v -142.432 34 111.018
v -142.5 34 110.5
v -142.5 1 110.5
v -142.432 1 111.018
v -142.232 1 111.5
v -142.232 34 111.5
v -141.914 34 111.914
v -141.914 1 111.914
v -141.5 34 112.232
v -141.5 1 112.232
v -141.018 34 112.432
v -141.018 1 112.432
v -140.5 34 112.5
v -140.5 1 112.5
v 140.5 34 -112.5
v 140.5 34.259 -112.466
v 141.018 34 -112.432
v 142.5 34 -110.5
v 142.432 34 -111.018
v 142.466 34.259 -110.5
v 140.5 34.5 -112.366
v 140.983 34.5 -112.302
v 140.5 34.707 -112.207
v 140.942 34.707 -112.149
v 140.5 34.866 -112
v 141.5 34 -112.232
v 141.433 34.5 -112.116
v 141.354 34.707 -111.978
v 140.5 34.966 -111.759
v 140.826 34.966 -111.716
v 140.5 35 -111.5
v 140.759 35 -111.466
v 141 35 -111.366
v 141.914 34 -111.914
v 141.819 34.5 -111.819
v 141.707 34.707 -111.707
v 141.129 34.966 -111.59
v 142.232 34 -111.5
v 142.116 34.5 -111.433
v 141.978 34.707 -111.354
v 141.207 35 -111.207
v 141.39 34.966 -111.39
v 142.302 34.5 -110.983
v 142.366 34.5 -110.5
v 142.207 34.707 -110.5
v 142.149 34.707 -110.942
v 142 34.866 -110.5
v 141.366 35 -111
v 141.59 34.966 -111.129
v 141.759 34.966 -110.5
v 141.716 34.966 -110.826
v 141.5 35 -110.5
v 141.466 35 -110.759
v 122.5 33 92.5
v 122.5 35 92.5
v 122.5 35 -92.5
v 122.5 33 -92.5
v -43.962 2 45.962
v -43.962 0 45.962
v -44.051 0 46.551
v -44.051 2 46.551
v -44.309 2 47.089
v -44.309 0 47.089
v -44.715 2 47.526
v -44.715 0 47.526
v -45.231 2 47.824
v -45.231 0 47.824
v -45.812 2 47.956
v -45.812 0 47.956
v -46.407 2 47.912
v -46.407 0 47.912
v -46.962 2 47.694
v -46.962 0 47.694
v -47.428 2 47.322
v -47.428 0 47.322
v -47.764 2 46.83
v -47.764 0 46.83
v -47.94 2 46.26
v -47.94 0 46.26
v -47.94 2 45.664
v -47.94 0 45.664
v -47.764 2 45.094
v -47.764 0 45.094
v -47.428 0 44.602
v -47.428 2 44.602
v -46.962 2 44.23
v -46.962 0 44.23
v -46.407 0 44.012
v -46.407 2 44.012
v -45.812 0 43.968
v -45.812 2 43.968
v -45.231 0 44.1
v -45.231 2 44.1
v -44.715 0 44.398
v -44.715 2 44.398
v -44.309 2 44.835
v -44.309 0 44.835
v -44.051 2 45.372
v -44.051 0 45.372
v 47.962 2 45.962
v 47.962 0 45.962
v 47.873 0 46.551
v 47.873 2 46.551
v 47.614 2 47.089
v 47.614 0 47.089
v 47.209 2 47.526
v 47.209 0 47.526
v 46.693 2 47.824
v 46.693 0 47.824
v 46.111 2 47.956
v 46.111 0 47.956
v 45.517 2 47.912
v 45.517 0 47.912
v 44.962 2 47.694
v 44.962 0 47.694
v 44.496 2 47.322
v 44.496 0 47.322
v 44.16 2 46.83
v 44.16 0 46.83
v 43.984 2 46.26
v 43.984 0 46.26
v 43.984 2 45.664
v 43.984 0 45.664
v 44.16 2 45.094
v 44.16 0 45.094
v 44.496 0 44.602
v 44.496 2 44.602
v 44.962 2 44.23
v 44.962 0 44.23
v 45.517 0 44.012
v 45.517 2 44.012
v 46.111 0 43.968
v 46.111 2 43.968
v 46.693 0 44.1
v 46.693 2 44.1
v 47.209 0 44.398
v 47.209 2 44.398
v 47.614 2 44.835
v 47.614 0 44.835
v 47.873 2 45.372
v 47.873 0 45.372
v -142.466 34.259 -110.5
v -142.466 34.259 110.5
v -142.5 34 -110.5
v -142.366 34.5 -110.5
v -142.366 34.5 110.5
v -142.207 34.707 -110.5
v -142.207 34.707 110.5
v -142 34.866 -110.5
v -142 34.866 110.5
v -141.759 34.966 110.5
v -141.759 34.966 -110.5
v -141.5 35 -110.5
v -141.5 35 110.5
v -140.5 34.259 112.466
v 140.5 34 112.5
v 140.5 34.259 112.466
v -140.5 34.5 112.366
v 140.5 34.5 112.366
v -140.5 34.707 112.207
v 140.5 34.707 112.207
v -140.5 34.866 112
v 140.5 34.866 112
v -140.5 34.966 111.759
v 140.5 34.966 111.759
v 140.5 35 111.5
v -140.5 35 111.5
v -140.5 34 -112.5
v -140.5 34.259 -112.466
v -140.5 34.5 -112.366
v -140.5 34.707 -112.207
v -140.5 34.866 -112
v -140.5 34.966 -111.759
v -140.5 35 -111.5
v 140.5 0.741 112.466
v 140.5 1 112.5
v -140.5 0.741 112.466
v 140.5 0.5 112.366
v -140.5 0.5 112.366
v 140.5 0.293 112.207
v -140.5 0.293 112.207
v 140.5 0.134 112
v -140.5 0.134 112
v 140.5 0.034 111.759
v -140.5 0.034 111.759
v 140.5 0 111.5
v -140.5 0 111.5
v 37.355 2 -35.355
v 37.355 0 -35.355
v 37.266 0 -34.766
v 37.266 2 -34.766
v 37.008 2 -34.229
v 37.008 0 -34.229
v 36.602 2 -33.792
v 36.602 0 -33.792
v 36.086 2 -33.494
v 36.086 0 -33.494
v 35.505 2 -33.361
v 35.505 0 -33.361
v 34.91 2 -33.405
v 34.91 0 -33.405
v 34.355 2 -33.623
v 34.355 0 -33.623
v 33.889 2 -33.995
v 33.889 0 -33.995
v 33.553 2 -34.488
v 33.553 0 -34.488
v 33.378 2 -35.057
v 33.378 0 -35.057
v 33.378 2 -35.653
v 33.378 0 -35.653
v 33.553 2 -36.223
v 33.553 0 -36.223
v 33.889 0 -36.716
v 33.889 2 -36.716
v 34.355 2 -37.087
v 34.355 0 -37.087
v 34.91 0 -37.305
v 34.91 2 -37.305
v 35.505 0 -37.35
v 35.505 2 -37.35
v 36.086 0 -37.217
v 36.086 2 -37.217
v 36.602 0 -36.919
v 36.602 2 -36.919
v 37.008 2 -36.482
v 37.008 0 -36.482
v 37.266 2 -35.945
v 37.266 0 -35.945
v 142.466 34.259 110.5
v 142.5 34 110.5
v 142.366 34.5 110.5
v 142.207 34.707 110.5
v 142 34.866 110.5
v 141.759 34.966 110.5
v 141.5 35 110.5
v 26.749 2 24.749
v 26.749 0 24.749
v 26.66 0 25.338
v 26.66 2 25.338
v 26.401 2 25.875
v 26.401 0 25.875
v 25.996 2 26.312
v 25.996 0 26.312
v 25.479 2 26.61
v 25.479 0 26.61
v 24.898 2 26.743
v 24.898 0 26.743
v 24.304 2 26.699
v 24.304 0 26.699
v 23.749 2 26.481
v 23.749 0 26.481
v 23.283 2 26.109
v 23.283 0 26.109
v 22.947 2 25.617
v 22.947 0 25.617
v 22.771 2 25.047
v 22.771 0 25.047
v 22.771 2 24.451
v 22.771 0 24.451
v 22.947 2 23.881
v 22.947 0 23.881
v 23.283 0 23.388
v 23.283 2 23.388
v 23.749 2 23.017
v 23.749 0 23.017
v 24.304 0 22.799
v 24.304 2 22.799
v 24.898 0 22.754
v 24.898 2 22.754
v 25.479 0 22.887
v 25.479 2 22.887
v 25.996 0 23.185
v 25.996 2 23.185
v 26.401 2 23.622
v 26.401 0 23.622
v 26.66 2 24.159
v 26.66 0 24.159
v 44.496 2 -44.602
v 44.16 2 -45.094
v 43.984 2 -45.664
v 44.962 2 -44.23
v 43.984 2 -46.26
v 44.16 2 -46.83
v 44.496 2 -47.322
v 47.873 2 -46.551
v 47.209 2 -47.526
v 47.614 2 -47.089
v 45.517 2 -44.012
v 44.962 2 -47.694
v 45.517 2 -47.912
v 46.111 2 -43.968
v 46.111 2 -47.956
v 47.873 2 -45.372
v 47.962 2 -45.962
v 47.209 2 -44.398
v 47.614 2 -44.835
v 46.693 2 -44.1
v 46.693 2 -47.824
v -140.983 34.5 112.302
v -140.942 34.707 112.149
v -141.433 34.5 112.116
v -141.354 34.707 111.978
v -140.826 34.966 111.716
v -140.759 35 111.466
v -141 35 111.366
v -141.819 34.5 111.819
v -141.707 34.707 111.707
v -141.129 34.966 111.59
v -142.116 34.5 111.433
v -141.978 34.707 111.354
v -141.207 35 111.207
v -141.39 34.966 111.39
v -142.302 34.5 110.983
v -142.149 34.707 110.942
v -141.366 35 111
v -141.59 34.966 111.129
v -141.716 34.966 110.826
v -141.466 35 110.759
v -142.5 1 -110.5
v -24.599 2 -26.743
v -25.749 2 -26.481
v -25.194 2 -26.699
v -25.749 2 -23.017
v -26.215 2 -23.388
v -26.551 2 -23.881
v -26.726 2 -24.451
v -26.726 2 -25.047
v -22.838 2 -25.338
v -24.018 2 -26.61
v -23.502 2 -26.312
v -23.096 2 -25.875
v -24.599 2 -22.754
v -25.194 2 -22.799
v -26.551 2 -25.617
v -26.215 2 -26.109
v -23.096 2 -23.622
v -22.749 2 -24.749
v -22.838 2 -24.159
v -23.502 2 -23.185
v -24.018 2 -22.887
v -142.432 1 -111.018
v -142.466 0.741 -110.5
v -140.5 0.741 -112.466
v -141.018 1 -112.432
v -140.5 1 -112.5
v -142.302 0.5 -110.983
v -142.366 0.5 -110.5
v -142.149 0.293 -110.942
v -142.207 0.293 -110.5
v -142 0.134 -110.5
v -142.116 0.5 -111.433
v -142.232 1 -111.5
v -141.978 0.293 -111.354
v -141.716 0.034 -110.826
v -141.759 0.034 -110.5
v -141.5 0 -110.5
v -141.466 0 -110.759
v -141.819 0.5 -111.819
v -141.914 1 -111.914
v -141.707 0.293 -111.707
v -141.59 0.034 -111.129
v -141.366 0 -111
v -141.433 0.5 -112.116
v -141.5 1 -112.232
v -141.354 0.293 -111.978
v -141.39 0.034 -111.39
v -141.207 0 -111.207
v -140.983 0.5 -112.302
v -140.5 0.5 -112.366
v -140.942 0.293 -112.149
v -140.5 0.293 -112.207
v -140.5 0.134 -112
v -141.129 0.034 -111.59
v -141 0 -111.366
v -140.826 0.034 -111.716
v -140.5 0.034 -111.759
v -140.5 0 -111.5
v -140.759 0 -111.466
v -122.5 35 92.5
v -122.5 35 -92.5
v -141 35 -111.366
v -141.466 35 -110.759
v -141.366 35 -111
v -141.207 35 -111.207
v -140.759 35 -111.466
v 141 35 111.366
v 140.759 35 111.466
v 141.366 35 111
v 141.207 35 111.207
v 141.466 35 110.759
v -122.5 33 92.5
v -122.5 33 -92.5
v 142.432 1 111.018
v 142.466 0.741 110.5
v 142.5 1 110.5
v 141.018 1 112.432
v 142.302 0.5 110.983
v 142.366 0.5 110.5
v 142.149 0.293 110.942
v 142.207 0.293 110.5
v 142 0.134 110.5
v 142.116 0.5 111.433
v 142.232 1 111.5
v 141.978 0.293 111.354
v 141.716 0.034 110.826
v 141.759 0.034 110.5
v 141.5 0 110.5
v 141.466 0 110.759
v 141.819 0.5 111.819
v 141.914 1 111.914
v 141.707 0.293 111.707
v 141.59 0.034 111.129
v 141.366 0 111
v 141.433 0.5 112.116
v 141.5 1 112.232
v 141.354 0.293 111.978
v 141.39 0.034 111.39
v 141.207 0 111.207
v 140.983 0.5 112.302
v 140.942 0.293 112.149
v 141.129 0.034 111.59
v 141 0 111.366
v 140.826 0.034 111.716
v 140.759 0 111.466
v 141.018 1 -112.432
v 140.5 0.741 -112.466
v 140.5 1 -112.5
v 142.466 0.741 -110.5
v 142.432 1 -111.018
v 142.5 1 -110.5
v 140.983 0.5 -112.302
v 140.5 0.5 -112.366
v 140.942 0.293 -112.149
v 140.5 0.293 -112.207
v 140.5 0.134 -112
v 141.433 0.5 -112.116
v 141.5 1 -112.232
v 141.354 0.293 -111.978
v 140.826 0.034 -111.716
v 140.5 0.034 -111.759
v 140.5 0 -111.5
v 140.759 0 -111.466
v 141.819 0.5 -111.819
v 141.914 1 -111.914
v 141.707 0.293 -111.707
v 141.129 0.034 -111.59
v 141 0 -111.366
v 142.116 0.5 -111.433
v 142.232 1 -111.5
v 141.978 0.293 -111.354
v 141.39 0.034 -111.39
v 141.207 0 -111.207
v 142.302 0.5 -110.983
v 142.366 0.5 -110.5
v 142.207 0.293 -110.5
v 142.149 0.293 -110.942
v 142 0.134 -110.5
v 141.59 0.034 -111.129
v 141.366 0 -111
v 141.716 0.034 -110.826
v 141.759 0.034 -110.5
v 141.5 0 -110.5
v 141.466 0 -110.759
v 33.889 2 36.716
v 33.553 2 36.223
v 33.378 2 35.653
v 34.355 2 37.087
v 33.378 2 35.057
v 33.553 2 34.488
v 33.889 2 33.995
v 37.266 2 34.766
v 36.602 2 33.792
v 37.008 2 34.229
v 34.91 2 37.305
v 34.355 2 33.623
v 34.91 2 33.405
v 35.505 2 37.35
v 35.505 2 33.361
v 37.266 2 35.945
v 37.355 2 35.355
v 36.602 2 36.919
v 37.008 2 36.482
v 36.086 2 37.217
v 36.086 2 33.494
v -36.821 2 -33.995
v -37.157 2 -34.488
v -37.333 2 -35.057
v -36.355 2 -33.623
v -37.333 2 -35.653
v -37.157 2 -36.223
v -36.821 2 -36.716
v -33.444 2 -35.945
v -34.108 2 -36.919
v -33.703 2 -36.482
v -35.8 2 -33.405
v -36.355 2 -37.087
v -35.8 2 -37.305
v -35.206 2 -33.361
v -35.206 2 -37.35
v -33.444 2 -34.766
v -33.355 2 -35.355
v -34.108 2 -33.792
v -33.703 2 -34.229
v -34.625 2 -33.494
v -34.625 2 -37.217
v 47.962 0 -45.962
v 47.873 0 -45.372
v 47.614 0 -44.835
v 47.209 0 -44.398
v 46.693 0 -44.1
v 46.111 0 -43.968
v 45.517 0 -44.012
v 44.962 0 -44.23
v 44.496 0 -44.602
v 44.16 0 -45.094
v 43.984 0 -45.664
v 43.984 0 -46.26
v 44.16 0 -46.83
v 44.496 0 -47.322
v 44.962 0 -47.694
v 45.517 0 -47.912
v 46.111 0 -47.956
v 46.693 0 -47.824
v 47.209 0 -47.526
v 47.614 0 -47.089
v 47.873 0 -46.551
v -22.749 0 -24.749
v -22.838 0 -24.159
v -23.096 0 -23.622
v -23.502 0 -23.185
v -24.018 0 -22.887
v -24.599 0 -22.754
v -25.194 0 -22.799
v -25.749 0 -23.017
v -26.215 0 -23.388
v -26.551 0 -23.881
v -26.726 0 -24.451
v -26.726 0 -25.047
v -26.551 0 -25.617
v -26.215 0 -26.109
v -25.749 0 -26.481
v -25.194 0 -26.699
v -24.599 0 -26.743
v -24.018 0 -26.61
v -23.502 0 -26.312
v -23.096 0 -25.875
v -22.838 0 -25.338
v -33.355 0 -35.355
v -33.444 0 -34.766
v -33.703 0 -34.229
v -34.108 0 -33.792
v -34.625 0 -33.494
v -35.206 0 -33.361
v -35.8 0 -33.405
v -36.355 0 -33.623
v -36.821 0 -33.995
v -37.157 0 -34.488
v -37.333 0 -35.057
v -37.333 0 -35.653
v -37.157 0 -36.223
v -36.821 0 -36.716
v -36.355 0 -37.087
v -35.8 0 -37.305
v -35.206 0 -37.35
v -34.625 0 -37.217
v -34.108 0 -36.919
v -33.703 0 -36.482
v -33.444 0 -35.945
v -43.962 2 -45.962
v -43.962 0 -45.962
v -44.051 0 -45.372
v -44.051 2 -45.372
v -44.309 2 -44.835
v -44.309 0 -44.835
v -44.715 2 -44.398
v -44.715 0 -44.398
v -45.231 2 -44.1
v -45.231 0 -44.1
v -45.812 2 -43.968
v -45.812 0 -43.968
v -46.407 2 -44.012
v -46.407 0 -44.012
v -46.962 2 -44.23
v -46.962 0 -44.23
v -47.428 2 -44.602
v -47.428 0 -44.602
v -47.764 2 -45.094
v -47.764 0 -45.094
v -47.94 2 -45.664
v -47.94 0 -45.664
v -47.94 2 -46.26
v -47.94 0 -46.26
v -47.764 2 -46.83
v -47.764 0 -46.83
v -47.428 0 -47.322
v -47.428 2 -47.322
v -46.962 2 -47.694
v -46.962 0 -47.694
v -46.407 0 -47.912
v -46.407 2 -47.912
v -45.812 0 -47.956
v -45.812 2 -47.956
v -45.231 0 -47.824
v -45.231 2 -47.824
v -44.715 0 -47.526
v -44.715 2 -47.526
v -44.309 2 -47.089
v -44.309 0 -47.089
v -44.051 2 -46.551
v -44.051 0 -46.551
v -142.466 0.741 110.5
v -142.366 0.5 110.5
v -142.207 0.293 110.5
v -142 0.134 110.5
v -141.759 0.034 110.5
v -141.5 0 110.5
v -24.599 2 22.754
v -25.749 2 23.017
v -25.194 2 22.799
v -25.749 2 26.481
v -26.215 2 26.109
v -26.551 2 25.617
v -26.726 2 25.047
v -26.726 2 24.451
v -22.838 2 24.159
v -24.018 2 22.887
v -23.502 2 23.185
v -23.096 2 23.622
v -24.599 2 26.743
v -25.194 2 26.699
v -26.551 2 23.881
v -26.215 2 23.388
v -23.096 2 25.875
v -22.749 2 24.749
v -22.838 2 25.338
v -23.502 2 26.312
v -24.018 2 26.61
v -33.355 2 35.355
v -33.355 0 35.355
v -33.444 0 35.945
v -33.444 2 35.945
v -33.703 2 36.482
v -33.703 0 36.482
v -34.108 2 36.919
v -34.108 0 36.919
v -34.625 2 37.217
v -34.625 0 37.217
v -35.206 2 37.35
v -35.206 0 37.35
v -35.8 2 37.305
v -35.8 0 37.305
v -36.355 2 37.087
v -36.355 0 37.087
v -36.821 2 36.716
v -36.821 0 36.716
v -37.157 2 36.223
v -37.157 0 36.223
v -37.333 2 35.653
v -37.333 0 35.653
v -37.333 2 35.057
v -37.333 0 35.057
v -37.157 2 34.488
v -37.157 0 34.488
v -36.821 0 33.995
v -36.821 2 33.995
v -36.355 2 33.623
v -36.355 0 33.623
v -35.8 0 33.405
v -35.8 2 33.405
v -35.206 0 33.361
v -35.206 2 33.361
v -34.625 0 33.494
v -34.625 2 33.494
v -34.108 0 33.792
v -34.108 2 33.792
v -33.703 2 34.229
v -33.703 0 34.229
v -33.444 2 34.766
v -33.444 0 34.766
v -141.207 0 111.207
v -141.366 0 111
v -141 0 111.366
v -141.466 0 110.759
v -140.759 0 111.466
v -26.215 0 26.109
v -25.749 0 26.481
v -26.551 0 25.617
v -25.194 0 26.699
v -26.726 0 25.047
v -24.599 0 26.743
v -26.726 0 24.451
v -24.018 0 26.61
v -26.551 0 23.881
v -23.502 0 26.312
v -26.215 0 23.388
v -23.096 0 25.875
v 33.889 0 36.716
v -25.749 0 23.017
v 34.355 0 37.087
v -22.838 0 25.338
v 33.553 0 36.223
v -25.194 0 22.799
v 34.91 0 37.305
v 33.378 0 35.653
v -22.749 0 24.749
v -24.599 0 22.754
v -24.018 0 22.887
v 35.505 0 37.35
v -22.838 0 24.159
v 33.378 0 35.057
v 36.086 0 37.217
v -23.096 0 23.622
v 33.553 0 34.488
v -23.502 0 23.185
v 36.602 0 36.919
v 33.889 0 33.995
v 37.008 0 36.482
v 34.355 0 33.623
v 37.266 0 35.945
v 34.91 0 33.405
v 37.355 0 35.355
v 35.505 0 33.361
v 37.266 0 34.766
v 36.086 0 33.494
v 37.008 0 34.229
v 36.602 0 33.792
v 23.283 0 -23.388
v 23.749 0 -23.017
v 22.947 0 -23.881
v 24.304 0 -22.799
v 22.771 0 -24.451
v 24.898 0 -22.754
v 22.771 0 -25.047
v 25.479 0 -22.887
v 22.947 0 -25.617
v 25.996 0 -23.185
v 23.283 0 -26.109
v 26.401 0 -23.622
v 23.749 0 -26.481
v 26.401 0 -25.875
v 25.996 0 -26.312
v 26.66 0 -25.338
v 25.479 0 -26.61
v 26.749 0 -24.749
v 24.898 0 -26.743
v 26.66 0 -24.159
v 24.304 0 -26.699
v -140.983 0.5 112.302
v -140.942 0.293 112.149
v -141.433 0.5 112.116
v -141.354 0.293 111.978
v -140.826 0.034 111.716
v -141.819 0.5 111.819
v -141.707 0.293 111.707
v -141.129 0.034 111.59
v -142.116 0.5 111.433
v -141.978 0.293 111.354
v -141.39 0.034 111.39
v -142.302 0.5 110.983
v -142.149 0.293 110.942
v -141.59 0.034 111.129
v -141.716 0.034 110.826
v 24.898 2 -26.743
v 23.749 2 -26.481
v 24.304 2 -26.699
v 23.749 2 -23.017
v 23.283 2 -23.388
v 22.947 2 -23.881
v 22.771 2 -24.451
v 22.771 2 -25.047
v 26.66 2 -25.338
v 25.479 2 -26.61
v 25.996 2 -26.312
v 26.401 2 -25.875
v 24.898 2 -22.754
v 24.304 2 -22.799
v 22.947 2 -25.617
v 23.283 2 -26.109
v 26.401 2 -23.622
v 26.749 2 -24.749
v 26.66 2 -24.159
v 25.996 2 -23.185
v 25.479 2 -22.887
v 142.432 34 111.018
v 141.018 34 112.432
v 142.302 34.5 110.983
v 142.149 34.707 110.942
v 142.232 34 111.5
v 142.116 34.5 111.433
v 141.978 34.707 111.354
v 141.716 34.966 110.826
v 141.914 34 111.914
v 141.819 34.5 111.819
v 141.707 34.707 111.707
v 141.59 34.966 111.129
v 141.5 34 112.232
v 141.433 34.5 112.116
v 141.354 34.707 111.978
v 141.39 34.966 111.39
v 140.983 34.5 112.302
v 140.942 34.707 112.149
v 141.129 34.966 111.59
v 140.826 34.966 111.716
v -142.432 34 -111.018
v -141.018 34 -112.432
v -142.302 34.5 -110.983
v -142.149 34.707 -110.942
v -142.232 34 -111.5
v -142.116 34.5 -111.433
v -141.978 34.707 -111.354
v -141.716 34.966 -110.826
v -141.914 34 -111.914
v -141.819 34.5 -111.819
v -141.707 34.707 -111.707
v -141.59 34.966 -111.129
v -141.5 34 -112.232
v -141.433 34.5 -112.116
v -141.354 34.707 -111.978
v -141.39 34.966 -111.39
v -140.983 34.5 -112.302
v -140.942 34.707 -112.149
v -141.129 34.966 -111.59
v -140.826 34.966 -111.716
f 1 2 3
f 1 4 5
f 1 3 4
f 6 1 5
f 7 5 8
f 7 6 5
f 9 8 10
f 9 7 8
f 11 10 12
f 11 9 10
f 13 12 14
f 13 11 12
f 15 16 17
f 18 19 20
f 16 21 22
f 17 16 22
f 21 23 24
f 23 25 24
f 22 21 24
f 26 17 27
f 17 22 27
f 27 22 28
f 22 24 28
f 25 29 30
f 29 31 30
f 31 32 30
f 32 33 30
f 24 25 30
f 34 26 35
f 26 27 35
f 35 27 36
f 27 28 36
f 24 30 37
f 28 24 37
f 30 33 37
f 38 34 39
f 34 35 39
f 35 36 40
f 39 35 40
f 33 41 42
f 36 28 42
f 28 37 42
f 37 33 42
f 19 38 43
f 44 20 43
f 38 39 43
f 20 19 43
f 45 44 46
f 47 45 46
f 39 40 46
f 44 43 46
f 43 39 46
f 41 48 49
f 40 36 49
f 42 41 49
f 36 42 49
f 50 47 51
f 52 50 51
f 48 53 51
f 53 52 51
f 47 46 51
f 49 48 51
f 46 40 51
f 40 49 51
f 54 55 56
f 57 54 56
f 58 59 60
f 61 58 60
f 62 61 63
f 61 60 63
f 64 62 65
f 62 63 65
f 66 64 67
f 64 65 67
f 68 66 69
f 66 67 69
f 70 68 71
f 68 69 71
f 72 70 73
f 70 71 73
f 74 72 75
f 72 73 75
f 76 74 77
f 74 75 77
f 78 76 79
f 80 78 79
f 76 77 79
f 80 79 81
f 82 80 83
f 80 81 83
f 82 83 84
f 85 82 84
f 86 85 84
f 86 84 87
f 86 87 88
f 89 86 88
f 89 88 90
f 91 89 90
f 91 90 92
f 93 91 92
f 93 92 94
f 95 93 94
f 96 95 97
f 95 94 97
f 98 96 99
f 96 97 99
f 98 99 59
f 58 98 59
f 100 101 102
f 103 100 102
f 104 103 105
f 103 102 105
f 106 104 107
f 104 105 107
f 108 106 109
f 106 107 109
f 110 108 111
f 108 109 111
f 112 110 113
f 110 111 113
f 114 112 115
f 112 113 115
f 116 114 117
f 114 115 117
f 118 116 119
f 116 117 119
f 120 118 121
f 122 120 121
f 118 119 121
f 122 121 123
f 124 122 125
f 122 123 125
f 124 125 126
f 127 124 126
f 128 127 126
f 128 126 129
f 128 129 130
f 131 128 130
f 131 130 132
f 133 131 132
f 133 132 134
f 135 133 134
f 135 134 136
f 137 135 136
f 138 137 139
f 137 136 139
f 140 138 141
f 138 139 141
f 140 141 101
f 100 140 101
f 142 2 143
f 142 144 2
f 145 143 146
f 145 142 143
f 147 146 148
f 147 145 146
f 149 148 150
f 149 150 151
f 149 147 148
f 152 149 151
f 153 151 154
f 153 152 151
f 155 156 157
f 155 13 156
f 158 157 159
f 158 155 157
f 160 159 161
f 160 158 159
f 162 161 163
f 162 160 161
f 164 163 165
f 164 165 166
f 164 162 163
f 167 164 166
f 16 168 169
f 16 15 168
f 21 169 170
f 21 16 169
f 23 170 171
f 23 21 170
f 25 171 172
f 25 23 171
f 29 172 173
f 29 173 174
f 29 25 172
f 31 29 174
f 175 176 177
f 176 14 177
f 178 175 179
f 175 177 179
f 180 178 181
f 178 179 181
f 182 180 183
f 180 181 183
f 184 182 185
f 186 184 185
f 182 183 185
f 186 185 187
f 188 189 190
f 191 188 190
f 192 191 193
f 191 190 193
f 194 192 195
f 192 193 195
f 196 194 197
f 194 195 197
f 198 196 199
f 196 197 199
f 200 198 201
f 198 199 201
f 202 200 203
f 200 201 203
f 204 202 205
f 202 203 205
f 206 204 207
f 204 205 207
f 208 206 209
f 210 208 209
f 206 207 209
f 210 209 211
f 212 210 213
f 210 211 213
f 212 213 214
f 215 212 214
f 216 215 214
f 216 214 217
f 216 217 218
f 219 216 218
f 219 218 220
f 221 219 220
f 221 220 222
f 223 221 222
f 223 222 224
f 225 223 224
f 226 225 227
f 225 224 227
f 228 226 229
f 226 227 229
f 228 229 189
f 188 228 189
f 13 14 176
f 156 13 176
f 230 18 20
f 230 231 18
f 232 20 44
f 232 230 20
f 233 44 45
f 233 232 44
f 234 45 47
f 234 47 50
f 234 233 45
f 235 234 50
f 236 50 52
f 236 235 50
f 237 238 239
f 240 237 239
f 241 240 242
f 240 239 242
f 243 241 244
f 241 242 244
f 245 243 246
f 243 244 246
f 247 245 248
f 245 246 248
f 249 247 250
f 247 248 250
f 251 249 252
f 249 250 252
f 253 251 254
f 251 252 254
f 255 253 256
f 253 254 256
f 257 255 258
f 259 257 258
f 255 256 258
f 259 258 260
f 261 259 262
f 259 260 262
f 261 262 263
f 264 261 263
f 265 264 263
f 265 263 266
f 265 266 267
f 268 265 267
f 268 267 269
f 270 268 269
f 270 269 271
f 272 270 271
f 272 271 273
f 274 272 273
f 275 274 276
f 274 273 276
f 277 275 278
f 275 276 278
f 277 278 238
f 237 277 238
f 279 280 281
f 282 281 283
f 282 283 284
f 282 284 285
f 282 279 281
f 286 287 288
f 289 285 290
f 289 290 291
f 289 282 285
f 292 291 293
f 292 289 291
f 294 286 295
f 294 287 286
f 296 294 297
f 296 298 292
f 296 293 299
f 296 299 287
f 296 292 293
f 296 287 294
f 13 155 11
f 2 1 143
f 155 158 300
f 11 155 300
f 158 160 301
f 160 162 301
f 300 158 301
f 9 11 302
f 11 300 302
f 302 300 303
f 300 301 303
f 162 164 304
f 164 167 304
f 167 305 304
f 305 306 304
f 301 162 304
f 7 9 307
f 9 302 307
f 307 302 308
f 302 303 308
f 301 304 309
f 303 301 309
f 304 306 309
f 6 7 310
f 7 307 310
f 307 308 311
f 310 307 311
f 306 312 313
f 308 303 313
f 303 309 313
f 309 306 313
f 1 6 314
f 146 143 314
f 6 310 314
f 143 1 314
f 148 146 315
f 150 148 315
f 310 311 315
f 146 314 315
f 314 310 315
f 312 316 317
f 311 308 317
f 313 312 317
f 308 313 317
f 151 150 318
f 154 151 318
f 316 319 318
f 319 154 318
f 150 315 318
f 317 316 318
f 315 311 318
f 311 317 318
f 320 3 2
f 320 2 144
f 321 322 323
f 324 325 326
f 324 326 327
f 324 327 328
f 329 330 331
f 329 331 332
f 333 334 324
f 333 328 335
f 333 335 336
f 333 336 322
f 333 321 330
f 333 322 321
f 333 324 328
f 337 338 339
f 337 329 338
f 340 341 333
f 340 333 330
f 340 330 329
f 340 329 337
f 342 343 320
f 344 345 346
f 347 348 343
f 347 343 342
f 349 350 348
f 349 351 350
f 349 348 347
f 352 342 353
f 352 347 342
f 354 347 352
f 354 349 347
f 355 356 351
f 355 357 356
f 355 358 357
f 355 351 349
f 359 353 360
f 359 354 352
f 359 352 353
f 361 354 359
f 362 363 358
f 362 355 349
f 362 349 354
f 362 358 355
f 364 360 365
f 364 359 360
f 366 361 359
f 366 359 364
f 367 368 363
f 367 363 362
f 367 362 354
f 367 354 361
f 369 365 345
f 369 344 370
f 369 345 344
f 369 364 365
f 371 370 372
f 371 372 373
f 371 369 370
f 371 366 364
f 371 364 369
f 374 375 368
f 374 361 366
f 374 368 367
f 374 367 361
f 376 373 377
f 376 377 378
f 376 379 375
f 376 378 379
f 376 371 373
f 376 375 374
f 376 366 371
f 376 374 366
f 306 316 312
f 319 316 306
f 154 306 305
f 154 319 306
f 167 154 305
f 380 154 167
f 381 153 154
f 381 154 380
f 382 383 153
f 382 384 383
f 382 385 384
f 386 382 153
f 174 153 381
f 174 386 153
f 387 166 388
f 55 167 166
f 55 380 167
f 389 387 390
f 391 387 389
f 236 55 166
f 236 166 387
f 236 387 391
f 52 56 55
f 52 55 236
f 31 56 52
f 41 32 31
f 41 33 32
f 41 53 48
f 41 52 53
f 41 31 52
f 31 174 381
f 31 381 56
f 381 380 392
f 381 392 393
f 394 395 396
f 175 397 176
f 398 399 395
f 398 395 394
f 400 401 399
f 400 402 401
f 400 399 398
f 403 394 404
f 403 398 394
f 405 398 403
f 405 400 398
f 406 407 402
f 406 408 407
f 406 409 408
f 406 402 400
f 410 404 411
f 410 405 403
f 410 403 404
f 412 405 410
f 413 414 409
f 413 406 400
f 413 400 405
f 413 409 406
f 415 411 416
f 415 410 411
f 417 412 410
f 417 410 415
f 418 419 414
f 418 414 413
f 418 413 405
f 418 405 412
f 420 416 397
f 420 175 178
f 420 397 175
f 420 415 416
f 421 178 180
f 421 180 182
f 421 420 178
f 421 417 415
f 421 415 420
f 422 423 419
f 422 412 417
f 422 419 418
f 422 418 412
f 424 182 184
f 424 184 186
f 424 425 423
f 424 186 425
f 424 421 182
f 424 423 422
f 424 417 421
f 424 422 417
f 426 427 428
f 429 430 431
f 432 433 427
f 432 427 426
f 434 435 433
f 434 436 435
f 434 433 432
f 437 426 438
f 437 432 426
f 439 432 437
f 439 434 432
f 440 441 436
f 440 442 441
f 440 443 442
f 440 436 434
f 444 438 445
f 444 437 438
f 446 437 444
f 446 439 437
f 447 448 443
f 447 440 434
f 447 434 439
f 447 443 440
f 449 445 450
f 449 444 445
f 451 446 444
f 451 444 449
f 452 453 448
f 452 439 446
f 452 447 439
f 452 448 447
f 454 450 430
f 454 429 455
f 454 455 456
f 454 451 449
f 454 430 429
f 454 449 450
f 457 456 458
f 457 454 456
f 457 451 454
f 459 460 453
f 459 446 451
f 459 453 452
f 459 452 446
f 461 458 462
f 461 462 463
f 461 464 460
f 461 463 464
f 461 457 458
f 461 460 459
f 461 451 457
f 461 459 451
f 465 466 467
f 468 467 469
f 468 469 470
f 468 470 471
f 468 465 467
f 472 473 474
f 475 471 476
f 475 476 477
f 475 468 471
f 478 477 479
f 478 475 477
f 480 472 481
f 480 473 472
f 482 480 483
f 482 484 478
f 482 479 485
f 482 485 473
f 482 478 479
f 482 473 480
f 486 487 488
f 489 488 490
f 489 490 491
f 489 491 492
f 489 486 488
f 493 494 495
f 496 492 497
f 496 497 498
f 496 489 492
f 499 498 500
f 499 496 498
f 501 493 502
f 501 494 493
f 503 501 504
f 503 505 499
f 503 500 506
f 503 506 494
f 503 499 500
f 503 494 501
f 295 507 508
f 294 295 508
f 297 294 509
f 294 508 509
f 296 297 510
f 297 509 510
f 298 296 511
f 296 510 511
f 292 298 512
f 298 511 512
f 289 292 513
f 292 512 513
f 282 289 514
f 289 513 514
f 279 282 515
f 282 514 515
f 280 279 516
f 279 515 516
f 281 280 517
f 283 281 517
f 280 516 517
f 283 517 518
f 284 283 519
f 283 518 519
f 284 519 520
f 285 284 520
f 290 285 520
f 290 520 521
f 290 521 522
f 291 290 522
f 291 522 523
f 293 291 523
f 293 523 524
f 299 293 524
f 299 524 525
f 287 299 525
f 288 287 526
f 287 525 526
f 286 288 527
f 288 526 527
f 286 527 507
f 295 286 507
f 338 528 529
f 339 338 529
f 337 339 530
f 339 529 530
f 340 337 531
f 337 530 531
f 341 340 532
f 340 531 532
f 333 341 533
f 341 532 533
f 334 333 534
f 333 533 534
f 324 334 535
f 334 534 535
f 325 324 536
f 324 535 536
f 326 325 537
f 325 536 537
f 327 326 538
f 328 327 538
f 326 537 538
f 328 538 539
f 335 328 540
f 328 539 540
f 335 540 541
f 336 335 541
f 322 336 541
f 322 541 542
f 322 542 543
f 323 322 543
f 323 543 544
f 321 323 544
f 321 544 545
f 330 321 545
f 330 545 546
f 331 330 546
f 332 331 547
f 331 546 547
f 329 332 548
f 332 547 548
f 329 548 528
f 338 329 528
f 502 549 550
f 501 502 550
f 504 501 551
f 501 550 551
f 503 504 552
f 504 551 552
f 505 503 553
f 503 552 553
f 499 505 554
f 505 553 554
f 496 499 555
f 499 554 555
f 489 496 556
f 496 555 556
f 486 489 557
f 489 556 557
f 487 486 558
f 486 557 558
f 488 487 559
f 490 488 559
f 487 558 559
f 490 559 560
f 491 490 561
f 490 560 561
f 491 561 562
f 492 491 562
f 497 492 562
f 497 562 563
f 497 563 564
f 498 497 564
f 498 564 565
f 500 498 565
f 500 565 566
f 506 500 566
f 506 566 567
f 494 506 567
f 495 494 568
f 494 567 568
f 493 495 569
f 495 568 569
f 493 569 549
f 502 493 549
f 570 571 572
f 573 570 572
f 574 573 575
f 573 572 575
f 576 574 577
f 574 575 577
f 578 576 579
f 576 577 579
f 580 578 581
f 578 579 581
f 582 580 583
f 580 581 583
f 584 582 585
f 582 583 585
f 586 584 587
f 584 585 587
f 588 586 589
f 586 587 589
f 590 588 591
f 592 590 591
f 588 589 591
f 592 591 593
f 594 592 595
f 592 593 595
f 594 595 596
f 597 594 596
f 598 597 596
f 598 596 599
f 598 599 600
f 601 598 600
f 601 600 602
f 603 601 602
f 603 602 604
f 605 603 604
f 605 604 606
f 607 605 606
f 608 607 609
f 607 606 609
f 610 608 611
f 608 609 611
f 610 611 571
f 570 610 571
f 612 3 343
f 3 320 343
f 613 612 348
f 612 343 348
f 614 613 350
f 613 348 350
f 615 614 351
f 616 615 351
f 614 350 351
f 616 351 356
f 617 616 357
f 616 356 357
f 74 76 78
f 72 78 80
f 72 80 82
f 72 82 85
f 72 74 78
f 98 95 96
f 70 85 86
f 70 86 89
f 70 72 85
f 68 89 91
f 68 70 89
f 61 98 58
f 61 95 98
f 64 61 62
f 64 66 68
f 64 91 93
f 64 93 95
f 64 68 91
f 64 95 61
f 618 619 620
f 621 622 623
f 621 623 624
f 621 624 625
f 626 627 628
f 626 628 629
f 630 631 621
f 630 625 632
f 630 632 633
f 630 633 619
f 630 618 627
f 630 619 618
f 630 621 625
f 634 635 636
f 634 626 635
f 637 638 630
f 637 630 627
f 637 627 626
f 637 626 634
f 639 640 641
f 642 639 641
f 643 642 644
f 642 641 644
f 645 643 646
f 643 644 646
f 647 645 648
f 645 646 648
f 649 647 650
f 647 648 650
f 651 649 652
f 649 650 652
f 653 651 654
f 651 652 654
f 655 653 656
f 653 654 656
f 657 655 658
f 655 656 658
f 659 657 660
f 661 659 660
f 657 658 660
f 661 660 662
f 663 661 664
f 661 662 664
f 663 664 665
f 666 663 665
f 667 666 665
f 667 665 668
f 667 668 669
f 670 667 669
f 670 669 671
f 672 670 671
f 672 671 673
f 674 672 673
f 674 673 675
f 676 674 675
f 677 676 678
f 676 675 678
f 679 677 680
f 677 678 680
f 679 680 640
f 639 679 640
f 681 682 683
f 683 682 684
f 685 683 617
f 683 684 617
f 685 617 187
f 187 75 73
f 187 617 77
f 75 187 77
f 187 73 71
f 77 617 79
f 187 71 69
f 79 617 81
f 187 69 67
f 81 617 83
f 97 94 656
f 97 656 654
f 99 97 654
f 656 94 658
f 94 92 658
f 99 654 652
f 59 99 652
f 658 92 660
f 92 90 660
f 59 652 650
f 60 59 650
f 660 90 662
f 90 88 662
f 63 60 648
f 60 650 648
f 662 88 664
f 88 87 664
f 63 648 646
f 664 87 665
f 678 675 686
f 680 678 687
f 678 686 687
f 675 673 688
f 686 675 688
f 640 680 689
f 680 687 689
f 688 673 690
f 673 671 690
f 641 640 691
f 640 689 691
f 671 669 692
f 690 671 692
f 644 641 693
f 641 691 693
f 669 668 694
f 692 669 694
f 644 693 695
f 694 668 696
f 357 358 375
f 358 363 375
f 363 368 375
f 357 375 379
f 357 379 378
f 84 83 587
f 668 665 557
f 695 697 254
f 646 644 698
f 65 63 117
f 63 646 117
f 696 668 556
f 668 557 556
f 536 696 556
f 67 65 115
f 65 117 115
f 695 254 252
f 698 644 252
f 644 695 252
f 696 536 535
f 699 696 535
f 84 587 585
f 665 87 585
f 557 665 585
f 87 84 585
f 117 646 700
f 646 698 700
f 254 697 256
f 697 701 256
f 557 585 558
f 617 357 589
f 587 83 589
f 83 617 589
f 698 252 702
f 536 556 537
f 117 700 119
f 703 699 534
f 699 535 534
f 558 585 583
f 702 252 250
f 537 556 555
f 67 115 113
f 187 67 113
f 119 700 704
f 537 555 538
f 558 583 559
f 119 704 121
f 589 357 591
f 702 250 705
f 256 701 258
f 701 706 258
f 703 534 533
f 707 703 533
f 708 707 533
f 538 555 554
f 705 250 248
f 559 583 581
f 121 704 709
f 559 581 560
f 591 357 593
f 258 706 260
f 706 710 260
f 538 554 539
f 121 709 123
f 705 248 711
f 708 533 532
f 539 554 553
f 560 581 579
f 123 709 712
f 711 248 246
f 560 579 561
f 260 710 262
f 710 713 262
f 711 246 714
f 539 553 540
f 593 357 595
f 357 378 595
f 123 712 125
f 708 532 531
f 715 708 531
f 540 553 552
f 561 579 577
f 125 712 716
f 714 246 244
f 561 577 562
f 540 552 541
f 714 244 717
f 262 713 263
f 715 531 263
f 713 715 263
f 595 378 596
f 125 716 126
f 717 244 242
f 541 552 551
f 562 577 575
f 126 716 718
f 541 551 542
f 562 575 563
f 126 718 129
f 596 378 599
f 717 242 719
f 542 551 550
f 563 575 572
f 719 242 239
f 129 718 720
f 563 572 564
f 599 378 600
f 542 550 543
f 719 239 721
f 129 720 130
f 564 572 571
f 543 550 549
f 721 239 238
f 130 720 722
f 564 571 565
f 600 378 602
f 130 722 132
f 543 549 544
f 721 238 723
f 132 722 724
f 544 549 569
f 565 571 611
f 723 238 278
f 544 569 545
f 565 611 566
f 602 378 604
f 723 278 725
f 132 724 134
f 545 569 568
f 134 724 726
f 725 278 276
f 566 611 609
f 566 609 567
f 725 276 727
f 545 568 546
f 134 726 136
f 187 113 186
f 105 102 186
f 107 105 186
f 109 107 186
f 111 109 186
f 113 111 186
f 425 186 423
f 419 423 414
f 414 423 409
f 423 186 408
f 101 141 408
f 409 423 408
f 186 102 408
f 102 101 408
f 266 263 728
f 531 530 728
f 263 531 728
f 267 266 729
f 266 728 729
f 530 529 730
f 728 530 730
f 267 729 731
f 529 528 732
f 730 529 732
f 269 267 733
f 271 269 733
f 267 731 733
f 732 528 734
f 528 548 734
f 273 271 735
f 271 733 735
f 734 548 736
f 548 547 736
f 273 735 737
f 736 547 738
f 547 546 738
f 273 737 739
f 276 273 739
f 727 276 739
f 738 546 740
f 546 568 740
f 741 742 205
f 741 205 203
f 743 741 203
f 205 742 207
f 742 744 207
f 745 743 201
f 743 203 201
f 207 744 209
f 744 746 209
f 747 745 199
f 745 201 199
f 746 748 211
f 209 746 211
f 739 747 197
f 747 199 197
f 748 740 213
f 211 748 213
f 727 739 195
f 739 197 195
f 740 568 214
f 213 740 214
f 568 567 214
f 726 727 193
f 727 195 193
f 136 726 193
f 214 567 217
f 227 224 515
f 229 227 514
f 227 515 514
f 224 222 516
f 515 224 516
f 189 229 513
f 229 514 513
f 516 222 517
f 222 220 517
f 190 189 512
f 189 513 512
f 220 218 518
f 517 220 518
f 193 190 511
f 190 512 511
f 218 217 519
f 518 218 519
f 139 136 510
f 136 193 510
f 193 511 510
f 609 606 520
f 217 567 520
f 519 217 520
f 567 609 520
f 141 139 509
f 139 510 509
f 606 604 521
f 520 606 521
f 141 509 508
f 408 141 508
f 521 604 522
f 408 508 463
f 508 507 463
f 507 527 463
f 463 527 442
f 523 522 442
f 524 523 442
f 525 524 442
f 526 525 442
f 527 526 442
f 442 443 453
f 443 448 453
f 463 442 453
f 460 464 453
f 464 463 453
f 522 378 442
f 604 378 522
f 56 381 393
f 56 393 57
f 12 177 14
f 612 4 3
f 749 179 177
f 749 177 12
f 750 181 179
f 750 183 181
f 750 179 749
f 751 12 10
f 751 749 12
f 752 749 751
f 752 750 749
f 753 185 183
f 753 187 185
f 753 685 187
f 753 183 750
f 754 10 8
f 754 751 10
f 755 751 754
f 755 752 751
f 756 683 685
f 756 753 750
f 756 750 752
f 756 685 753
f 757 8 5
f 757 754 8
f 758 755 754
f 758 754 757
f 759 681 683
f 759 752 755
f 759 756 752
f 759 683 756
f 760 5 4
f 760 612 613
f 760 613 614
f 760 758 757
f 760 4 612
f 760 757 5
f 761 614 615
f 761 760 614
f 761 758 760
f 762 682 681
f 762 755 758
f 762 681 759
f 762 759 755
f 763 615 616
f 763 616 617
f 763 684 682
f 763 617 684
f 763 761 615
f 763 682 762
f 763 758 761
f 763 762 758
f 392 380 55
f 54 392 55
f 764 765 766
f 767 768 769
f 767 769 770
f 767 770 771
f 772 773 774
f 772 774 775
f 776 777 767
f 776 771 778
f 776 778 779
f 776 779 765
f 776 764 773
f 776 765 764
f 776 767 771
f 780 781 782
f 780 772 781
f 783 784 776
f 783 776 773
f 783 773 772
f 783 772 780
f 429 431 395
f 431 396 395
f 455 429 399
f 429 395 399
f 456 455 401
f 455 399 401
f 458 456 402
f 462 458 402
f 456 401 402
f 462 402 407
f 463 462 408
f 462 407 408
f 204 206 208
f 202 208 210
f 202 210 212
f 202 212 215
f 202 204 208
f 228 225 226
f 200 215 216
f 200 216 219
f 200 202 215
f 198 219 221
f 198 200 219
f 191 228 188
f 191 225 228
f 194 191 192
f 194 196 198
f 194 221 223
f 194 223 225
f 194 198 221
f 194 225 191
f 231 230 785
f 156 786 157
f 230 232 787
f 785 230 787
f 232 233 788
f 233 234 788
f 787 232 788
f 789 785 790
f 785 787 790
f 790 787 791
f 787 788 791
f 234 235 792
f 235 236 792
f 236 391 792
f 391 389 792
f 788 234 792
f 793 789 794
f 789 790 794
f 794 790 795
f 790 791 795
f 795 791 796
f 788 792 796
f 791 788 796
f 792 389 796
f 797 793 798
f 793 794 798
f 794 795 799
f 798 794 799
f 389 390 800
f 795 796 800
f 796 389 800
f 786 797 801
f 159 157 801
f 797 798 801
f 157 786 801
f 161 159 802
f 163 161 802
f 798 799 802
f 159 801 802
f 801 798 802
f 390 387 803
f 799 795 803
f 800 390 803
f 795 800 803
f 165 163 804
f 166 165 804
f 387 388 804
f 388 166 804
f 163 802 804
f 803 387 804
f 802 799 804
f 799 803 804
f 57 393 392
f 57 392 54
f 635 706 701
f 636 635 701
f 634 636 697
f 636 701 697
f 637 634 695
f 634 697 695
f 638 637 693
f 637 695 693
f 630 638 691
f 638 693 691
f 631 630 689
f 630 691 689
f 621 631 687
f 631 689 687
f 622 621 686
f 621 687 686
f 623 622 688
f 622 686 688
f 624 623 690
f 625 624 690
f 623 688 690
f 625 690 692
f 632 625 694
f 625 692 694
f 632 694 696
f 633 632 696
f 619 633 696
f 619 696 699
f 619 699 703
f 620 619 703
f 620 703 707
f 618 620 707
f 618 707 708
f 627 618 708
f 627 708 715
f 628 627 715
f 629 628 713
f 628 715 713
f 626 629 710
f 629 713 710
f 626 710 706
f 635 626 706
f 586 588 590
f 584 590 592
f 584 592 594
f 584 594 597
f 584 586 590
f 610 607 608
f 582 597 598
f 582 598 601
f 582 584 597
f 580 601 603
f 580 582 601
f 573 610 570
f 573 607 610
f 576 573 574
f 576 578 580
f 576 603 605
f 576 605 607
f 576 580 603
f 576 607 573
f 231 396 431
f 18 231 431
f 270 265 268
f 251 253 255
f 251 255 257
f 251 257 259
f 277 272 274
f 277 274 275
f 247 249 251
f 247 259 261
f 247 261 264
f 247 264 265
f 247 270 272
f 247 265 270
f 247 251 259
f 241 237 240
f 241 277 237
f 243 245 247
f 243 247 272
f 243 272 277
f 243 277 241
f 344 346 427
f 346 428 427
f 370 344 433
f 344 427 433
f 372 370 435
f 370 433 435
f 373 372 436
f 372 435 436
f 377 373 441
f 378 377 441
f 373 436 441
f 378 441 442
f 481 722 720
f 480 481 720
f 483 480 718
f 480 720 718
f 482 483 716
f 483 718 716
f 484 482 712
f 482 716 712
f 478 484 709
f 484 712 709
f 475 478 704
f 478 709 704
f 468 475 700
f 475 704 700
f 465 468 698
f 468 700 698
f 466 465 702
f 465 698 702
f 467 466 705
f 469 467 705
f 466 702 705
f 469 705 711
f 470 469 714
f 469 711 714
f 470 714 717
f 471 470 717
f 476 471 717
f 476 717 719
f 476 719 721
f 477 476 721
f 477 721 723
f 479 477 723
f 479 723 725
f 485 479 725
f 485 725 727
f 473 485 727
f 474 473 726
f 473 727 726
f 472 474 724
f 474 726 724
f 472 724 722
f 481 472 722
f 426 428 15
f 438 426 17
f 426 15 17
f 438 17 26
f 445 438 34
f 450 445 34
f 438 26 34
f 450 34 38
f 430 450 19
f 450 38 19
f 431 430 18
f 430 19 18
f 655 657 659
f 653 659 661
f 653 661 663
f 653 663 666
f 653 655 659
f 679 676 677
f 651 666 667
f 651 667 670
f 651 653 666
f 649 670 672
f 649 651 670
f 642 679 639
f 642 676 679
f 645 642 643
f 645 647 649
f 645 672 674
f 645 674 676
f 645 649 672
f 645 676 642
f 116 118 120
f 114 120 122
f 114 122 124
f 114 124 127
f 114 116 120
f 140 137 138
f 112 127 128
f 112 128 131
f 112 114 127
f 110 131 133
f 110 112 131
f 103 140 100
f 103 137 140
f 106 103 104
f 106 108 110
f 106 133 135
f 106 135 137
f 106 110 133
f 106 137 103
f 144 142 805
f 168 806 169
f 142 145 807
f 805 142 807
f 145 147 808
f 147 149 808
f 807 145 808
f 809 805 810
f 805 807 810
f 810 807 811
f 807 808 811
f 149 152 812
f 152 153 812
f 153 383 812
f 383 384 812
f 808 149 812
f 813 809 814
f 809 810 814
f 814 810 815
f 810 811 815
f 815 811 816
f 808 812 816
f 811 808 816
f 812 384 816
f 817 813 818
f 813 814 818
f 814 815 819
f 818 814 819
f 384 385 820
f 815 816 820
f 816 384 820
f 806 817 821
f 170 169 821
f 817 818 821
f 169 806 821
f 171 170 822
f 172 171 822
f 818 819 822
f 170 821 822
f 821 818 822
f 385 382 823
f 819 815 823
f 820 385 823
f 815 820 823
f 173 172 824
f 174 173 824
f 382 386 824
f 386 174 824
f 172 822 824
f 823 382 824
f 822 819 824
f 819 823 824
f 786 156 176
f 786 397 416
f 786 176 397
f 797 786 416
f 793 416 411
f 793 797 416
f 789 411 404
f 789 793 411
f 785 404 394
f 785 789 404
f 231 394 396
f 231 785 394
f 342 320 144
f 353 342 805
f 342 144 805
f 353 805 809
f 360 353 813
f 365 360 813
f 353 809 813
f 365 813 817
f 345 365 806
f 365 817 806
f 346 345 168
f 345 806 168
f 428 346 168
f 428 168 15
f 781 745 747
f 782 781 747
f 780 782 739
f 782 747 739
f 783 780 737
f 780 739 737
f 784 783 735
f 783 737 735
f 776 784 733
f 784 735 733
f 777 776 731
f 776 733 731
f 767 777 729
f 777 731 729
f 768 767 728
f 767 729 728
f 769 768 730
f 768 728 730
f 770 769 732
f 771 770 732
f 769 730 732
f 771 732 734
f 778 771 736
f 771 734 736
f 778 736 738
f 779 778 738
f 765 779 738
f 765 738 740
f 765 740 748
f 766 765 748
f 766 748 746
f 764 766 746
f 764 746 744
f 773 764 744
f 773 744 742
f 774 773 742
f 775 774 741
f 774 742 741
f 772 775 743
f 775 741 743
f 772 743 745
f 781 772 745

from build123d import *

# Parameters (mm, degrees)
SKETCH1_W           = 285
SKETCH1_H           = 225
BOSS_EXTRUDE1_DEPTH = 35
SKETCH2_W           = 245
SKETCH2_H           = 185
CUT_EXTRUDE1_DEPTH  = 2
FILLET1_R           = 2
FILLET2_R           = 1
FILLET3_R           = 1
SKETCH4_R           = 2
CUT_EXTRUDE2_DEPTH  = 2


with BuildPart() as part:
    # Sketch1 → Boss-Extrude1 (new body)
    with BuildSketch(Plane(origin=(0, 0, 0), x_dir=(1, 0, 0), z_dir=(0, 1, 0))):
        Rectangle(SKETCH1_W, SKETCH1_H)
    extrude(amount=BOSS_EXTRUDE1_DEPTH)

    # Sketch2 → Cut-Extrude1 (cut)
    with BuildSketch(Plane(origin=(0, 35, 0), x_dir=(1, 0, 0), z_dir=(0, 1, 0))):
        Rectangle(SKETCH2_W, SKETCH2_H)
    extrude(amount=-CUT_EXTRUDE1_DEPTH, mode=Mode.SUBTRACT)

    # Fillet1
    fillet1_edges = [part.edges().sort_by_distance(p)[0] for p in [
        (142.5, 17.5, 112.5),
        (-142.5, 17.5, 112.5),
        (-142.5, 17.5, -112.5),
        (142.5, 17.5, -112.5),
    ]]
    fillet(fillet1_edges, radius=FILLET1_R)

    # Fillet2
    fillet2_edges = [part.edges().sort_by_distance(p)[0] for p in [
        (-142.5, 35, 0),
        (0, 35, -112.5),
        (142.5, 35, 0),
        (0, 35, 112.5),
        (141.914213562, 35, 111.914213562),
        (141.914213562, 35, -111.914213562),
        (-141.914213562, 35, 111.914213562),
        (-141.914213562, 35, -111.914213562),
    ]]
    fillet(fillet2_edges, radius=FILLET2_R)

    # Fillet3
    fillet3_edges = [part.edges().sort_by_distance(p)[0] for p in [
        (-142.5, 0, 0),
        (142.5, 0, 0),
        (0, 0, 112.5),
        (0, 0, -112.5),
        (141.914213562, 0, 111.914213562),
        (141.914213562, 0, -111.914213562),
        (-141.914213562, 0, 111.914213562),
        (-141.914213562, 0, -111.914213562),
    ]]
    fillet(fillet3_edges, radius=FILLET3_R)

    # Sketch4 → Cut-Extrude2 (cut)
    with BuildSketch(Plane.XZ):
        with Locations((-24.748737342, 24.748737342)):
            Circle(SKETCH4_R)
        with Locations((-35.355339059, 35.355339059)):
            Circle(SKETCH4_R)
        with Locations((-45.961940777, 45.961940777)):
            Circle(SKETCH4_R)
        with Locations((24.748737342, 24.748737342)):
            Circle(SKETCH4_R)
        with Locations((35.355339059, 35.355339059)):
            Circle(SKETCH4_R)
        with Locations((45.961940777, 45.961940777)):
            Circle(SKETCH4_R)
        with Locations((24.748737342, -24.748737342)):
            Circle(SKETCH4_R)
        with Locations((35.355339059, -35.355339059)):
            Circle(SKETCH4_R)
        with Locations((45.961940777, -45.961940777)):
            Circle(SKETCH4_R)
        with Locations((-24.748737342, -24.748737342)):
            Circle(SKETCH4_R)
        with Locations((-35.355339059, -35.355339059)):
            Circle(SKETCH4_R)
        with Locations((-45.961940777, -45.961940777)):
            Circle(SKETCH4_R)
    extrude(amount=-CUT_EXTRUDE2_DEPTH, mode=Mode.SUBTRACT)


solid = part.part
